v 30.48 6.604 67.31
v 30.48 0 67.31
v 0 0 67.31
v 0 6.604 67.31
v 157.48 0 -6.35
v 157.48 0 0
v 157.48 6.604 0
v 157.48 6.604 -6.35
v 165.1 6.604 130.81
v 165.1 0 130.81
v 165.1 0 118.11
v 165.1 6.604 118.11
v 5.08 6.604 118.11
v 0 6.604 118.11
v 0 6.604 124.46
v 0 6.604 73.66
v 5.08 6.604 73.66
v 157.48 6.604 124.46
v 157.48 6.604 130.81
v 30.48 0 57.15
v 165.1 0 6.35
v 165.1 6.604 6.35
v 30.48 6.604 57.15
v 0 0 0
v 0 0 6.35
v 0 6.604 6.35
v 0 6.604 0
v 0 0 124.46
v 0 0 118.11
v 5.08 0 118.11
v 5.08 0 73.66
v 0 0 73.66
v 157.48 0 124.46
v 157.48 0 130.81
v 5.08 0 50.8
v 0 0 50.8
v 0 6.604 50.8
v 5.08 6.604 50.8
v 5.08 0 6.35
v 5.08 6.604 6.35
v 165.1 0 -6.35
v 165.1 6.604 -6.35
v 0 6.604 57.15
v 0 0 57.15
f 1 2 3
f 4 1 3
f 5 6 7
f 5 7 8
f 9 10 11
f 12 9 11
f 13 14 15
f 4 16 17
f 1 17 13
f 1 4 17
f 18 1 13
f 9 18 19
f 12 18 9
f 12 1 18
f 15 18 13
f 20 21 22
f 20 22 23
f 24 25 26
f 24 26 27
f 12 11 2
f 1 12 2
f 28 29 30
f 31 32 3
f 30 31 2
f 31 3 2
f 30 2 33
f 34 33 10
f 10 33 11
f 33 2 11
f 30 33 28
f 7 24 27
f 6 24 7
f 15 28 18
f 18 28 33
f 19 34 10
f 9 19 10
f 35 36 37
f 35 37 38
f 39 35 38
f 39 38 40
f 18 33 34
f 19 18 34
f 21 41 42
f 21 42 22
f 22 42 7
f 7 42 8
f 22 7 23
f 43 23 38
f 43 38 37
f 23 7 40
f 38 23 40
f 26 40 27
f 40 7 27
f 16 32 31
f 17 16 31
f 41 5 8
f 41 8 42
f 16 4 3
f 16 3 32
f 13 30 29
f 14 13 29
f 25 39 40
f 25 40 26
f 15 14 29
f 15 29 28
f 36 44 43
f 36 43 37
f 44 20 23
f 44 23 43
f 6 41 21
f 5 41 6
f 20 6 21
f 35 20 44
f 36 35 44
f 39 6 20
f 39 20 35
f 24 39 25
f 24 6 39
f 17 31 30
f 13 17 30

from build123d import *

# Parameters (mm, degrees)
BOSS_EXTRUDE1_DEPTH   = 6.604
BOSS_EXTRUDE1_2_DEPTH = 6.604


with BuildPart() as part:
    # Sketch1 → Boss-Extrude1 (new body)
    with BuildSketch(Plane(origin=(0, 0, 0), x_dir=(1, 0, 0), z_dir=(0, 1, 0))):
        Polygon((157.48, 0), (157.48, 6.35), (165.1, 6.35), (165.1, -6.35), (30.48, -57.15), (0, -57.15), (0, -50.8), (5.08, -50.8), (5.08, -6.35), (0, -6.35), (0, 0), align=None)
    extrude(amount=BOSS_EXTRUDE1_DEPTH)


with BuildPart() as body_2:
    # Sketch1 → Boss-Extrude1 2 (new body)
    with BuildSketch(Plane(origin=(0, 0, 0), x_dir=(1, 0, 0), z_dir=(0, 1, 0))):
        Polygon((0, -73.66), (5.08, -73.66), (5.08, -118.11), (0, -118.11), (0, -124.46), (157.48, -124.46), (157.48, -130.81), (165.1, -130.81), (165.1, -118.11), (30.48, -67.31), (0, -67.31), align=None)
    extrude(amount=BOSS_EXTRUDE1_2_DEPTH)


solid = Compound([part.part, body_2.part])
